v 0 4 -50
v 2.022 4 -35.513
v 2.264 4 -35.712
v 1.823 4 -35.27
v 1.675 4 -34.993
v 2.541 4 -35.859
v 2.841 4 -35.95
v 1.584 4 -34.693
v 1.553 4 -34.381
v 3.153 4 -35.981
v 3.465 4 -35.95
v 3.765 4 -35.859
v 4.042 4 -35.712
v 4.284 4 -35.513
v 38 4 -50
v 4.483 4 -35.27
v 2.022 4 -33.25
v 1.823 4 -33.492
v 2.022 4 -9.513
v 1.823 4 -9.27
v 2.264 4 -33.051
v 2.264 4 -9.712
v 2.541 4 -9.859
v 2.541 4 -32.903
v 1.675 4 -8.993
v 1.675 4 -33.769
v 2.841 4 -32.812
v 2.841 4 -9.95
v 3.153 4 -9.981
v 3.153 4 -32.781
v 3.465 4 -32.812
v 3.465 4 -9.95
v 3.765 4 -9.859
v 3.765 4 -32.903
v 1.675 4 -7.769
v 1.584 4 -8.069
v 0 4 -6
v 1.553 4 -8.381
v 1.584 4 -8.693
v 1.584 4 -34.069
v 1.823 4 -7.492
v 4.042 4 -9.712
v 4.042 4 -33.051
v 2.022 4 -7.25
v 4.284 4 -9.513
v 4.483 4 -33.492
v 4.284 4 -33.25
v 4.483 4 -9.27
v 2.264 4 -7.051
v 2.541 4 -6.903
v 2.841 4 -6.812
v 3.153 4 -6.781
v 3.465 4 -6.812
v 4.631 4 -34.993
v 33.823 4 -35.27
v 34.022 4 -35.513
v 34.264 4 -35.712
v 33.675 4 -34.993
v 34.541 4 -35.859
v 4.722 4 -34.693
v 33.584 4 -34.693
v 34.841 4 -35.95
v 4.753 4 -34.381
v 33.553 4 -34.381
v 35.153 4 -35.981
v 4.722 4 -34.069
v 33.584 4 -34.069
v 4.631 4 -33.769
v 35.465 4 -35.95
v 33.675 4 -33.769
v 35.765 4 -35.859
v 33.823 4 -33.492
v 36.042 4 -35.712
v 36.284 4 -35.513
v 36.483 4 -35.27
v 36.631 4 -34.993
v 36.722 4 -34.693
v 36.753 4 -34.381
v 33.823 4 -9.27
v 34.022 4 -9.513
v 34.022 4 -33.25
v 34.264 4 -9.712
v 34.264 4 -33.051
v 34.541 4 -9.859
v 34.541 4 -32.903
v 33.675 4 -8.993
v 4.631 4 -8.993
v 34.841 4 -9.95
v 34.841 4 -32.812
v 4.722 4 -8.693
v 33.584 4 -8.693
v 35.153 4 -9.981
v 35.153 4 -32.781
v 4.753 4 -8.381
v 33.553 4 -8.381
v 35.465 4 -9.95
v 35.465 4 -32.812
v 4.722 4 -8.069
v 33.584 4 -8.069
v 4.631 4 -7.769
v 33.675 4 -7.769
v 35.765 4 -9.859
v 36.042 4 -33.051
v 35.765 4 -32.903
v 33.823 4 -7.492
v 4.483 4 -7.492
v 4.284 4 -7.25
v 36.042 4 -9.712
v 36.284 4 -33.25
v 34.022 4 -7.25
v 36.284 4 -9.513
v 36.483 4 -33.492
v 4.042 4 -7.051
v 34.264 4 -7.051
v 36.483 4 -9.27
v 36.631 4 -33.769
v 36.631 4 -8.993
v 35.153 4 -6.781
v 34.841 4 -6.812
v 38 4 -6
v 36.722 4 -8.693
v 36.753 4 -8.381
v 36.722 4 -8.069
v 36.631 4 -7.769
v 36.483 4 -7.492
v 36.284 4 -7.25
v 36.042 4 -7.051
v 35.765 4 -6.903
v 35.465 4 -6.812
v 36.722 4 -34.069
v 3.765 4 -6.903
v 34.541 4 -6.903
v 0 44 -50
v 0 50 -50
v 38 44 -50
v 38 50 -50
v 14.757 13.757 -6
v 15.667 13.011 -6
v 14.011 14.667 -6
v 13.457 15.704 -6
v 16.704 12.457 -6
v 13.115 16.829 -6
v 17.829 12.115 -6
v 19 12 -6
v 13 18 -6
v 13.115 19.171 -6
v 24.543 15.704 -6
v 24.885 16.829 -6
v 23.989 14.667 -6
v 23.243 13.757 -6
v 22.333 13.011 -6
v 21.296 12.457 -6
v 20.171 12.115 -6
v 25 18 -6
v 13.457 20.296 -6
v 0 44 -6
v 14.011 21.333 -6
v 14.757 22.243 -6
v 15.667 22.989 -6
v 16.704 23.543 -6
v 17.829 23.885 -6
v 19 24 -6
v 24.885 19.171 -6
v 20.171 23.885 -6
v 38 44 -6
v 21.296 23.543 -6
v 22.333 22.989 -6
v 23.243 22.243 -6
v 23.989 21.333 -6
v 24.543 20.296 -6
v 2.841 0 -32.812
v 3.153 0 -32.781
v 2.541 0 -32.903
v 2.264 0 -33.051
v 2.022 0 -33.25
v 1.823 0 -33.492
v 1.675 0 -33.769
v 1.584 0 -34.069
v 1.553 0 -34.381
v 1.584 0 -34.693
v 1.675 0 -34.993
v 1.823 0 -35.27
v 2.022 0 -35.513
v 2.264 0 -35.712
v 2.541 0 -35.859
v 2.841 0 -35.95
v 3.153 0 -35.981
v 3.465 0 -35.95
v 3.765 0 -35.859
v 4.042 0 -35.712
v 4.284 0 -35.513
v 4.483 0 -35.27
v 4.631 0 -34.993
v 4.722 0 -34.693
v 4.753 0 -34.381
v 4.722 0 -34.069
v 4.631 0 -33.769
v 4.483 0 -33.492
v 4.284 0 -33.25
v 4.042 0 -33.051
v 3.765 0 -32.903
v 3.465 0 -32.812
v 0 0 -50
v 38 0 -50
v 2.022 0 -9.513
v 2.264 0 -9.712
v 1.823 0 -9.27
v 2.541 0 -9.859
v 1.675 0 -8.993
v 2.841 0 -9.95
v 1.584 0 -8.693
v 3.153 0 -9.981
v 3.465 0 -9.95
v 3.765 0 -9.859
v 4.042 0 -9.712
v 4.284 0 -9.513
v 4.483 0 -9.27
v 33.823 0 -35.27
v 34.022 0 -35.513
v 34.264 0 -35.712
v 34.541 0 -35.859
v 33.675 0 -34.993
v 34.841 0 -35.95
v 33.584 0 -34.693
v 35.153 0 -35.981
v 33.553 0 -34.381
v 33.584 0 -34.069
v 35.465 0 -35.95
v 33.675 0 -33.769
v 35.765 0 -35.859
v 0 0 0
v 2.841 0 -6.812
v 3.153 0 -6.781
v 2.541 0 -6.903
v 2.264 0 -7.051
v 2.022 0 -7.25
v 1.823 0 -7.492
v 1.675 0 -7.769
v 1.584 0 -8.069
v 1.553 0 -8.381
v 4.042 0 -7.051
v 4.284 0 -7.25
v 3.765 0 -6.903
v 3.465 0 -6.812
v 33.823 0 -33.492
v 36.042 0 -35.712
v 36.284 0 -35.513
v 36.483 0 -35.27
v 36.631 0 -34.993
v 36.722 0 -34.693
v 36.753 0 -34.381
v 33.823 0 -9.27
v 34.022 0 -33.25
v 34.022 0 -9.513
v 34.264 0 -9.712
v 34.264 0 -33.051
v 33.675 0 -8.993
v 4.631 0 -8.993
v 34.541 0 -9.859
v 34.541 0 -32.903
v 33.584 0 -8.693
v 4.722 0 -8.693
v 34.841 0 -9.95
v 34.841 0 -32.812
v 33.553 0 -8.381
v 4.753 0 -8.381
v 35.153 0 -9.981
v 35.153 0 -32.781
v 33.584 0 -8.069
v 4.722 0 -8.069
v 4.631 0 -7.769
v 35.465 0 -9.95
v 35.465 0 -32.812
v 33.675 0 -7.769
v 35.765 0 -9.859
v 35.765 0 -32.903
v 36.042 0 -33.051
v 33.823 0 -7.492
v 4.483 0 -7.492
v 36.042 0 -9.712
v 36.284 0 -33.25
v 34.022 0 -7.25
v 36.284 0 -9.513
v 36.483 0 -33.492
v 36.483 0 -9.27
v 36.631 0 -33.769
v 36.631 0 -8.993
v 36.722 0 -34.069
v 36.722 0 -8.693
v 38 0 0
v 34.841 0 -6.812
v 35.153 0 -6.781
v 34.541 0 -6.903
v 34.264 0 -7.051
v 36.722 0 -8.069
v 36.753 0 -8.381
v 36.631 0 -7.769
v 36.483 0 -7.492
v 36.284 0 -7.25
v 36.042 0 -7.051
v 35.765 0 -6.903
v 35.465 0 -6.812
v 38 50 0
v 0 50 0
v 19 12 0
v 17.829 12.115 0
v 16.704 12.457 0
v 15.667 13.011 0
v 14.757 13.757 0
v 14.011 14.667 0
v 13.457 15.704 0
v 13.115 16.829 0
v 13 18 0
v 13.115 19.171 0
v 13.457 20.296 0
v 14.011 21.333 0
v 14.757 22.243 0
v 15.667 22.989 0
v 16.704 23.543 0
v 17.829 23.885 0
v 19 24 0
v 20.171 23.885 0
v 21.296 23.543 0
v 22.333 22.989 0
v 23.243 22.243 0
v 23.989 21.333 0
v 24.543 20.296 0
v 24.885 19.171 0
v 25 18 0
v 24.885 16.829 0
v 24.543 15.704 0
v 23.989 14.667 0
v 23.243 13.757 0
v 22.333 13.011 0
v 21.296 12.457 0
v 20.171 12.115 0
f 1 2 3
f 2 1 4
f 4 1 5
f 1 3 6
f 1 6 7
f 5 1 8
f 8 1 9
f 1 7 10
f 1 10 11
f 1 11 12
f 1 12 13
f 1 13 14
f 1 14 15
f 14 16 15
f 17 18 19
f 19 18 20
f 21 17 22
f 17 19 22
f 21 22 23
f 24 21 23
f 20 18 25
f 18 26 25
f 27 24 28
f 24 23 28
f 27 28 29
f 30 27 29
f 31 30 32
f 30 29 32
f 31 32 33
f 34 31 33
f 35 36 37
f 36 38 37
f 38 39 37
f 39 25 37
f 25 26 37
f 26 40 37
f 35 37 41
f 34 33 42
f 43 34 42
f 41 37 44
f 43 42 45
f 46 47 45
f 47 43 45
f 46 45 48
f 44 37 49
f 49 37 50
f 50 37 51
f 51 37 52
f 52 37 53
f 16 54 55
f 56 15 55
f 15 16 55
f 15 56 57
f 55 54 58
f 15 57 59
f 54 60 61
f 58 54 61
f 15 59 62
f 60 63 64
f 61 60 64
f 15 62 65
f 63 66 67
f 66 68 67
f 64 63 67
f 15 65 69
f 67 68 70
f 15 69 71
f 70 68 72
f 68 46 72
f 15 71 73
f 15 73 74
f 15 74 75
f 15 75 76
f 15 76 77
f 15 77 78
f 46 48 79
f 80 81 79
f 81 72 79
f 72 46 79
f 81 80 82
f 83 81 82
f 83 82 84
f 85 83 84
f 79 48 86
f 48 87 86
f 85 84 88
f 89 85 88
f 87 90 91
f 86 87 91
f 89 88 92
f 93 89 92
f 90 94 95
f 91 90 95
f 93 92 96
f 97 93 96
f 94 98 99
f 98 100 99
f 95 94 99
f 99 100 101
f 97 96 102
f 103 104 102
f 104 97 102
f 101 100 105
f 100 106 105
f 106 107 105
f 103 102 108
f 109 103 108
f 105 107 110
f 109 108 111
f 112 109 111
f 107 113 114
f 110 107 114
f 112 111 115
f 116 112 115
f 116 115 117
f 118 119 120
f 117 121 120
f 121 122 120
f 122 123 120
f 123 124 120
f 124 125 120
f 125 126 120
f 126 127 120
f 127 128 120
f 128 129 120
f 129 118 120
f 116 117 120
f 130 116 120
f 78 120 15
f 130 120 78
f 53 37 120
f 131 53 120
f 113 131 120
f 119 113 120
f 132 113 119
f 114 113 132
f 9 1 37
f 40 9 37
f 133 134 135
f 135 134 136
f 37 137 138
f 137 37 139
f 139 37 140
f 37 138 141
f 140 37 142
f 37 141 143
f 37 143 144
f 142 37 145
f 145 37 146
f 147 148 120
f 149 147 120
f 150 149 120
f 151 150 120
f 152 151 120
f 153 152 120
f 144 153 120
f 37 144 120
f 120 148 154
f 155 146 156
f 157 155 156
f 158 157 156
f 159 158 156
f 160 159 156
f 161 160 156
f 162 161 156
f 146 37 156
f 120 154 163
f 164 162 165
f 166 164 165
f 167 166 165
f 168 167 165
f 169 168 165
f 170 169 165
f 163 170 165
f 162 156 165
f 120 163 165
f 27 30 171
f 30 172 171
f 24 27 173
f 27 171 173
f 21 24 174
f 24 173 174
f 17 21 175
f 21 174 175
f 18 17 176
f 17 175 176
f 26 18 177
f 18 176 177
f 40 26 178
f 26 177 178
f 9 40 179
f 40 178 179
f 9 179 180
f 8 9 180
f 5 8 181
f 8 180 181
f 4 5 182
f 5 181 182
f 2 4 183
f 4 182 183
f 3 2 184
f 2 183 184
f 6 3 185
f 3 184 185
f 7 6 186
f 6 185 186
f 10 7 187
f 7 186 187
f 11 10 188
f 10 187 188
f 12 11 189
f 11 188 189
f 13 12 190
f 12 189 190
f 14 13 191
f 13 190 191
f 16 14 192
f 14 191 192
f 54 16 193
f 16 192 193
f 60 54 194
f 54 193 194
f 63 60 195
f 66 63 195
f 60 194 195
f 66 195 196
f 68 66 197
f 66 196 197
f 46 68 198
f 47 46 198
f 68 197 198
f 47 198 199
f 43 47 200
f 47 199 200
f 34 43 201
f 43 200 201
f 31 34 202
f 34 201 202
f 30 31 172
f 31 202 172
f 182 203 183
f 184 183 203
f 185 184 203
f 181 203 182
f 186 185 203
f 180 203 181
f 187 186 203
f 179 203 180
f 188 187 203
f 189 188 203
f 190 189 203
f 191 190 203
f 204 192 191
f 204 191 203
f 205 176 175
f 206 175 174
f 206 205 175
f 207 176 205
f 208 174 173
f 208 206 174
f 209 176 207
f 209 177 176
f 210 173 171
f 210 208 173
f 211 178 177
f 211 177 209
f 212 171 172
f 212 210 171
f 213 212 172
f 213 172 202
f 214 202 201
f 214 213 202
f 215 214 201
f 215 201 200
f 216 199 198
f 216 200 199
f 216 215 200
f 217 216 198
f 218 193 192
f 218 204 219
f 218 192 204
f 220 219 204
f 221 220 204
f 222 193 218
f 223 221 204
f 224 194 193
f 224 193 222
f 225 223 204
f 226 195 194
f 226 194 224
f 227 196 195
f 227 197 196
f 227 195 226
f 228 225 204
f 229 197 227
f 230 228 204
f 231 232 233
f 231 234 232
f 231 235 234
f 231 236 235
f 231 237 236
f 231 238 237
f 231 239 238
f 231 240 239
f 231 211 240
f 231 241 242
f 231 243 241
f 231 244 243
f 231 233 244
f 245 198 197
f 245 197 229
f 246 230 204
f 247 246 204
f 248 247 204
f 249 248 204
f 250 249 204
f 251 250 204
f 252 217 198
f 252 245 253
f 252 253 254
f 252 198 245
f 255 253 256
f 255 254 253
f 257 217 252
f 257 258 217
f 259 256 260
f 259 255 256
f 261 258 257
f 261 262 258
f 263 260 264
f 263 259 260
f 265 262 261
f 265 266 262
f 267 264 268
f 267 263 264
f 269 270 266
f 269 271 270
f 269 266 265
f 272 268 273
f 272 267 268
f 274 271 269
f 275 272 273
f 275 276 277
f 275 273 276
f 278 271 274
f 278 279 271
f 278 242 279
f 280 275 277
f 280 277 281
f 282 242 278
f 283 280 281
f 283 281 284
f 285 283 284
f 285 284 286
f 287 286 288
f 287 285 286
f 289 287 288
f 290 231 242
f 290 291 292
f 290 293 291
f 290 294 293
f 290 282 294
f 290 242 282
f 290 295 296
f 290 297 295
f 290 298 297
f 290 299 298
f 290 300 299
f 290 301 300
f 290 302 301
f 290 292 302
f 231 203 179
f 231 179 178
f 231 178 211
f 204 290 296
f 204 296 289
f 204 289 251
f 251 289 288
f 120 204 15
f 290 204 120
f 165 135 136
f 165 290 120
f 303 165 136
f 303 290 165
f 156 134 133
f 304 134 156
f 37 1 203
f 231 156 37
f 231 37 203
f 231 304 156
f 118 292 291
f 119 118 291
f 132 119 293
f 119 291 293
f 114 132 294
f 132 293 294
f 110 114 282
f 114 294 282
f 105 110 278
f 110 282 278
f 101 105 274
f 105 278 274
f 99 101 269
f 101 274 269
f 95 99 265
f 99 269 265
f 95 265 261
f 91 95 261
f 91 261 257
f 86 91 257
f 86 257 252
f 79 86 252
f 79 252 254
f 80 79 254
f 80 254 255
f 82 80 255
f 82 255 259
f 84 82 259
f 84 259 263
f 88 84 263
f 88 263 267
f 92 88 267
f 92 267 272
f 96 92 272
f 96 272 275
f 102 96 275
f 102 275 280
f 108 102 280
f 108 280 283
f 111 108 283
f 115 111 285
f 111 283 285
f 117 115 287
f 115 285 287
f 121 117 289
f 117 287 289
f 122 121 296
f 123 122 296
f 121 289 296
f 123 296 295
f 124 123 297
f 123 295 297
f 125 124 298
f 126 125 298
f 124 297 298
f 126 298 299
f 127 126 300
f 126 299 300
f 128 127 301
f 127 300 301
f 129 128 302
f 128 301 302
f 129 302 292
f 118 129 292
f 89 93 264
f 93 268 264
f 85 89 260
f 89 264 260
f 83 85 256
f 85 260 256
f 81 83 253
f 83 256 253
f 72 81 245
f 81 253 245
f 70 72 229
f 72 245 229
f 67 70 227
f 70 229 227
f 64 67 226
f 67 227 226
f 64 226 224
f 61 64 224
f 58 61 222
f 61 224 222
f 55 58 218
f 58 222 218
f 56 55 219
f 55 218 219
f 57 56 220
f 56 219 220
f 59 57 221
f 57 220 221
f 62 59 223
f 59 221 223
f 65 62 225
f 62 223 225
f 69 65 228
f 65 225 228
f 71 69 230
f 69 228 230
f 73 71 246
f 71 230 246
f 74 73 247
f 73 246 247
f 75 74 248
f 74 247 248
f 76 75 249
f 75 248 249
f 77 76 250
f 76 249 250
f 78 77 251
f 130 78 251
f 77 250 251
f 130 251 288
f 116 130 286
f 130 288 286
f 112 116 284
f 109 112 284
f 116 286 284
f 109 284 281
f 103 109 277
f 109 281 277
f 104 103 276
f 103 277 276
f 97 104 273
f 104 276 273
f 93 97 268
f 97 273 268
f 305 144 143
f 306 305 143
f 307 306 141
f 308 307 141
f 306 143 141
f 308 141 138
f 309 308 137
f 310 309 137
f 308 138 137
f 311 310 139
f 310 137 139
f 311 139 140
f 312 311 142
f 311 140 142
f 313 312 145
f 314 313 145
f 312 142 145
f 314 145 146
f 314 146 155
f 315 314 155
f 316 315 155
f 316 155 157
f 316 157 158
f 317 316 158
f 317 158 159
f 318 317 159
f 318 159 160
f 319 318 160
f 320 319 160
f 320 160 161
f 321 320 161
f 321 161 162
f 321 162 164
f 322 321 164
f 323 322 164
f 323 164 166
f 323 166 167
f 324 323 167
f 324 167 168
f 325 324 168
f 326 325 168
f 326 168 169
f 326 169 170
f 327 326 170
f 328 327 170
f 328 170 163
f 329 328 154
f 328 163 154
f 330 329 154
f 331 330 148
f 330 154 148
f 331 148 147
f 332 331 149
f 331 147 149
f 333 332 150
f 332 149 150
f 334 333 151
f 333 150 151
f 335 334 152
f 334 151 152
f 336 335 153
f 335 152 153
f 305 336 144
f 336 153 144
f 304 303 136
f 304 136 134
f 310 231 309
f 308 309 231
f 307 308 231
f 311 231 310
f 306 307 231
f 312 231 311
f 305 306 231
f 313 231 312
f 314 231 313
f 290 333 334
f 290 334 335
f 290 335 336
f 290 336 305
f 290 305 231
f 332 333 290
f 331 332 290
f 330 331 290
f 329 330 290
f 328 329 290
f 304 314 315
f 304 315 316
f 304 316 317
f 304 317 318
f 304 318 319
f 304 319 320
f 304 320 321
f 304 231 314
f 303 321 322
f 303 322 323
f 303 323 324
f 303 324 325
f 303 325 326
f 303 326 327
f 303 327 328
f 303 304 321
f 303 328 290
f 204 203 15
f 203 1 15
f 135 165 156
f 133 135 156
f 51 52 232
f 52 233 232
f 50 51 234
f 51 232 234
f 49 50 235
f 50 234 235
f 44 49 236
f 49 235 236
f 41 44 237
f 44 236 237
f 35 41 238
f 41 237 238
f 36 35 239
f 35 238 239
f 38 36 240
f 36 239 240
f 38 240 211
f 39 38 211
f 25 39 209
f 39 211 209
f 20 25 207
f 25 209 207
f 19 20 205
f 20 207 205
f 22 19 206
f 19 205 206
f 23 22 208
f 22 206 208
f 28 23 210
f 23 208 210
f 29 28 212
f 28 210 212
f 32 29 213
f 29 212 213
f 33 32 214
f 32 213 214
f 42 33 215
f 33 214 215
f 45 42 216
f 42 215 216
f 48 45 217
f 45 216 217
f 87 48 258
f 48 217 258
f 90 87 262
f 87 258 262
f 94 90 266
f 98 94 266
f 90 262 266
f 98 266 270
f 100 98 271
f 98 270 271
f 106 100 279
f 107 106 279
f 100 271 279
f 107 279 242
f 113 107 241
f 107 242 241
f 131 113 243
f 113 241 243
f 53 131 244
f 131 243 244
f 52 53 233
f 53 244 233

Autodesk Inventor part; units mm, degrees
ref_plane "YZ Plane" through (0, 0, 0) normal (1, 0, 0) x (0, 1, 0)
ref_plane "XZ Plane" through (0, 0, 0) normal (0, 1, 0) x (-1, 0, 0)
ref_plane "XY Plane" through (0, 0, 0) normal (0, 0, 1) x (1, 0, 0)
sketch "スケッチ1" plane through (0, 0, 0) normal (0, 0, 1) x (1, 0, 0)
  line L0 (0, 0) -> (38, 0)
  line L1 (38, 0) -> (38, 24)
  line L2 (38, 24) -> (0, 24)
  line L3 (0, 24) -> (0, 0)
  line L4 (0, 4) -> (38, 4)
  line L5 (13, 33) -> (25, 33)
  line L6 (0, 24) -> (38, 24)
  line L7 (38, 24) -> (38, 44)
  line L8 (38, 44) -> (0, 44)
  line L9 (0, 44) -> (0, 24)
  line L10 (0, 44) -> (38, 44)
  line L11 (38, 44) -> (38, 50)
  line L12 (38, 50) -> (0, 50)
  line L13 (0, 50) -> (0, 44)
  circle A0 centre (19, 33) radius 6
  point P0 (38, 24)
  point P1 (19, 4)
  point P2 (15.6834, 26)
  point P3 (22.3166, 26)
  point P4 (13, 33)
  dimension "d70" = 12
  dimension "d0" = 38
  dimension "d1" = 24
  dimension "d2" = 4
  dimension "d49" = 6
  dimension "d50" = 38
  dimension "d51" = 20
  dimension "d52" = 38
  dimension "d71" = 29
  dimension "d72" = 19
extrude "押し出し1" add sketch "スケッチ1" against normal blind 6 contours L3 L4 L1 L0 | L3 L2 L1 L4 | L9 L8 L7 L2 | L13 L12 L11 L8 | A0 L5 | L5 A0
extrude "押し出し2" add sketch "スケッチ1" against normal blind 50 contours L3 L4 L1 L0 | L13 L12 L11 L8
sketch "スケッチ2" plane through (0, 0, 0) normal (0, 0, 1) x (1, 0, 0)
  line L0 (0, 50) -> (0, 0) projected
  line L1 (38, 50) -> (0, 50) projected
  line L2 (38, 0) -> (38, 50) projected
  line L3 (38, 50) -> (0, 50) projected
  line L4 (0, 50) -> (0, 0) projected
  line L5 (0, 0) -> (38, 0) projected
  point P0 (19, 18)
  point P1 (0, 26)
  point P2 (0, 25)
  point P3 (19, 50)
  point P4 (19, 0)
  point P5 (19, 50)
  dimension "d74" = 32
hole "穴1" at (19, 18, 0) direction (0, 0, -1) diameter 12 depth 8.1 tip angle 118
sketch "スケッチ4" plane through (0, 4, -6) normal (0, 1, 0) x (1, 0, 0)
  point P0 (0, -6)
  point P1 (3.1531, 2.3812)
  point P2 (35.1531, 2.3812)
  point P3 (35.1531, 28.3812)
  point P4 (3.1531, 28.3812)
  dimension "d47" = 32
  dimension "d48" = 26
hole "穴3" at (3.1531, 4, -8.3812) at (35.1531, 4, -8.3812) at (35.1531, 4, -34.3812) at (3.1531, 4, -34.3812) direction (0, -1, 0) diameter 3.2 depth 8.1 tip angle 118
equation "\"d51\" = d1 - d2"
properties part number "ギアボックス2"
